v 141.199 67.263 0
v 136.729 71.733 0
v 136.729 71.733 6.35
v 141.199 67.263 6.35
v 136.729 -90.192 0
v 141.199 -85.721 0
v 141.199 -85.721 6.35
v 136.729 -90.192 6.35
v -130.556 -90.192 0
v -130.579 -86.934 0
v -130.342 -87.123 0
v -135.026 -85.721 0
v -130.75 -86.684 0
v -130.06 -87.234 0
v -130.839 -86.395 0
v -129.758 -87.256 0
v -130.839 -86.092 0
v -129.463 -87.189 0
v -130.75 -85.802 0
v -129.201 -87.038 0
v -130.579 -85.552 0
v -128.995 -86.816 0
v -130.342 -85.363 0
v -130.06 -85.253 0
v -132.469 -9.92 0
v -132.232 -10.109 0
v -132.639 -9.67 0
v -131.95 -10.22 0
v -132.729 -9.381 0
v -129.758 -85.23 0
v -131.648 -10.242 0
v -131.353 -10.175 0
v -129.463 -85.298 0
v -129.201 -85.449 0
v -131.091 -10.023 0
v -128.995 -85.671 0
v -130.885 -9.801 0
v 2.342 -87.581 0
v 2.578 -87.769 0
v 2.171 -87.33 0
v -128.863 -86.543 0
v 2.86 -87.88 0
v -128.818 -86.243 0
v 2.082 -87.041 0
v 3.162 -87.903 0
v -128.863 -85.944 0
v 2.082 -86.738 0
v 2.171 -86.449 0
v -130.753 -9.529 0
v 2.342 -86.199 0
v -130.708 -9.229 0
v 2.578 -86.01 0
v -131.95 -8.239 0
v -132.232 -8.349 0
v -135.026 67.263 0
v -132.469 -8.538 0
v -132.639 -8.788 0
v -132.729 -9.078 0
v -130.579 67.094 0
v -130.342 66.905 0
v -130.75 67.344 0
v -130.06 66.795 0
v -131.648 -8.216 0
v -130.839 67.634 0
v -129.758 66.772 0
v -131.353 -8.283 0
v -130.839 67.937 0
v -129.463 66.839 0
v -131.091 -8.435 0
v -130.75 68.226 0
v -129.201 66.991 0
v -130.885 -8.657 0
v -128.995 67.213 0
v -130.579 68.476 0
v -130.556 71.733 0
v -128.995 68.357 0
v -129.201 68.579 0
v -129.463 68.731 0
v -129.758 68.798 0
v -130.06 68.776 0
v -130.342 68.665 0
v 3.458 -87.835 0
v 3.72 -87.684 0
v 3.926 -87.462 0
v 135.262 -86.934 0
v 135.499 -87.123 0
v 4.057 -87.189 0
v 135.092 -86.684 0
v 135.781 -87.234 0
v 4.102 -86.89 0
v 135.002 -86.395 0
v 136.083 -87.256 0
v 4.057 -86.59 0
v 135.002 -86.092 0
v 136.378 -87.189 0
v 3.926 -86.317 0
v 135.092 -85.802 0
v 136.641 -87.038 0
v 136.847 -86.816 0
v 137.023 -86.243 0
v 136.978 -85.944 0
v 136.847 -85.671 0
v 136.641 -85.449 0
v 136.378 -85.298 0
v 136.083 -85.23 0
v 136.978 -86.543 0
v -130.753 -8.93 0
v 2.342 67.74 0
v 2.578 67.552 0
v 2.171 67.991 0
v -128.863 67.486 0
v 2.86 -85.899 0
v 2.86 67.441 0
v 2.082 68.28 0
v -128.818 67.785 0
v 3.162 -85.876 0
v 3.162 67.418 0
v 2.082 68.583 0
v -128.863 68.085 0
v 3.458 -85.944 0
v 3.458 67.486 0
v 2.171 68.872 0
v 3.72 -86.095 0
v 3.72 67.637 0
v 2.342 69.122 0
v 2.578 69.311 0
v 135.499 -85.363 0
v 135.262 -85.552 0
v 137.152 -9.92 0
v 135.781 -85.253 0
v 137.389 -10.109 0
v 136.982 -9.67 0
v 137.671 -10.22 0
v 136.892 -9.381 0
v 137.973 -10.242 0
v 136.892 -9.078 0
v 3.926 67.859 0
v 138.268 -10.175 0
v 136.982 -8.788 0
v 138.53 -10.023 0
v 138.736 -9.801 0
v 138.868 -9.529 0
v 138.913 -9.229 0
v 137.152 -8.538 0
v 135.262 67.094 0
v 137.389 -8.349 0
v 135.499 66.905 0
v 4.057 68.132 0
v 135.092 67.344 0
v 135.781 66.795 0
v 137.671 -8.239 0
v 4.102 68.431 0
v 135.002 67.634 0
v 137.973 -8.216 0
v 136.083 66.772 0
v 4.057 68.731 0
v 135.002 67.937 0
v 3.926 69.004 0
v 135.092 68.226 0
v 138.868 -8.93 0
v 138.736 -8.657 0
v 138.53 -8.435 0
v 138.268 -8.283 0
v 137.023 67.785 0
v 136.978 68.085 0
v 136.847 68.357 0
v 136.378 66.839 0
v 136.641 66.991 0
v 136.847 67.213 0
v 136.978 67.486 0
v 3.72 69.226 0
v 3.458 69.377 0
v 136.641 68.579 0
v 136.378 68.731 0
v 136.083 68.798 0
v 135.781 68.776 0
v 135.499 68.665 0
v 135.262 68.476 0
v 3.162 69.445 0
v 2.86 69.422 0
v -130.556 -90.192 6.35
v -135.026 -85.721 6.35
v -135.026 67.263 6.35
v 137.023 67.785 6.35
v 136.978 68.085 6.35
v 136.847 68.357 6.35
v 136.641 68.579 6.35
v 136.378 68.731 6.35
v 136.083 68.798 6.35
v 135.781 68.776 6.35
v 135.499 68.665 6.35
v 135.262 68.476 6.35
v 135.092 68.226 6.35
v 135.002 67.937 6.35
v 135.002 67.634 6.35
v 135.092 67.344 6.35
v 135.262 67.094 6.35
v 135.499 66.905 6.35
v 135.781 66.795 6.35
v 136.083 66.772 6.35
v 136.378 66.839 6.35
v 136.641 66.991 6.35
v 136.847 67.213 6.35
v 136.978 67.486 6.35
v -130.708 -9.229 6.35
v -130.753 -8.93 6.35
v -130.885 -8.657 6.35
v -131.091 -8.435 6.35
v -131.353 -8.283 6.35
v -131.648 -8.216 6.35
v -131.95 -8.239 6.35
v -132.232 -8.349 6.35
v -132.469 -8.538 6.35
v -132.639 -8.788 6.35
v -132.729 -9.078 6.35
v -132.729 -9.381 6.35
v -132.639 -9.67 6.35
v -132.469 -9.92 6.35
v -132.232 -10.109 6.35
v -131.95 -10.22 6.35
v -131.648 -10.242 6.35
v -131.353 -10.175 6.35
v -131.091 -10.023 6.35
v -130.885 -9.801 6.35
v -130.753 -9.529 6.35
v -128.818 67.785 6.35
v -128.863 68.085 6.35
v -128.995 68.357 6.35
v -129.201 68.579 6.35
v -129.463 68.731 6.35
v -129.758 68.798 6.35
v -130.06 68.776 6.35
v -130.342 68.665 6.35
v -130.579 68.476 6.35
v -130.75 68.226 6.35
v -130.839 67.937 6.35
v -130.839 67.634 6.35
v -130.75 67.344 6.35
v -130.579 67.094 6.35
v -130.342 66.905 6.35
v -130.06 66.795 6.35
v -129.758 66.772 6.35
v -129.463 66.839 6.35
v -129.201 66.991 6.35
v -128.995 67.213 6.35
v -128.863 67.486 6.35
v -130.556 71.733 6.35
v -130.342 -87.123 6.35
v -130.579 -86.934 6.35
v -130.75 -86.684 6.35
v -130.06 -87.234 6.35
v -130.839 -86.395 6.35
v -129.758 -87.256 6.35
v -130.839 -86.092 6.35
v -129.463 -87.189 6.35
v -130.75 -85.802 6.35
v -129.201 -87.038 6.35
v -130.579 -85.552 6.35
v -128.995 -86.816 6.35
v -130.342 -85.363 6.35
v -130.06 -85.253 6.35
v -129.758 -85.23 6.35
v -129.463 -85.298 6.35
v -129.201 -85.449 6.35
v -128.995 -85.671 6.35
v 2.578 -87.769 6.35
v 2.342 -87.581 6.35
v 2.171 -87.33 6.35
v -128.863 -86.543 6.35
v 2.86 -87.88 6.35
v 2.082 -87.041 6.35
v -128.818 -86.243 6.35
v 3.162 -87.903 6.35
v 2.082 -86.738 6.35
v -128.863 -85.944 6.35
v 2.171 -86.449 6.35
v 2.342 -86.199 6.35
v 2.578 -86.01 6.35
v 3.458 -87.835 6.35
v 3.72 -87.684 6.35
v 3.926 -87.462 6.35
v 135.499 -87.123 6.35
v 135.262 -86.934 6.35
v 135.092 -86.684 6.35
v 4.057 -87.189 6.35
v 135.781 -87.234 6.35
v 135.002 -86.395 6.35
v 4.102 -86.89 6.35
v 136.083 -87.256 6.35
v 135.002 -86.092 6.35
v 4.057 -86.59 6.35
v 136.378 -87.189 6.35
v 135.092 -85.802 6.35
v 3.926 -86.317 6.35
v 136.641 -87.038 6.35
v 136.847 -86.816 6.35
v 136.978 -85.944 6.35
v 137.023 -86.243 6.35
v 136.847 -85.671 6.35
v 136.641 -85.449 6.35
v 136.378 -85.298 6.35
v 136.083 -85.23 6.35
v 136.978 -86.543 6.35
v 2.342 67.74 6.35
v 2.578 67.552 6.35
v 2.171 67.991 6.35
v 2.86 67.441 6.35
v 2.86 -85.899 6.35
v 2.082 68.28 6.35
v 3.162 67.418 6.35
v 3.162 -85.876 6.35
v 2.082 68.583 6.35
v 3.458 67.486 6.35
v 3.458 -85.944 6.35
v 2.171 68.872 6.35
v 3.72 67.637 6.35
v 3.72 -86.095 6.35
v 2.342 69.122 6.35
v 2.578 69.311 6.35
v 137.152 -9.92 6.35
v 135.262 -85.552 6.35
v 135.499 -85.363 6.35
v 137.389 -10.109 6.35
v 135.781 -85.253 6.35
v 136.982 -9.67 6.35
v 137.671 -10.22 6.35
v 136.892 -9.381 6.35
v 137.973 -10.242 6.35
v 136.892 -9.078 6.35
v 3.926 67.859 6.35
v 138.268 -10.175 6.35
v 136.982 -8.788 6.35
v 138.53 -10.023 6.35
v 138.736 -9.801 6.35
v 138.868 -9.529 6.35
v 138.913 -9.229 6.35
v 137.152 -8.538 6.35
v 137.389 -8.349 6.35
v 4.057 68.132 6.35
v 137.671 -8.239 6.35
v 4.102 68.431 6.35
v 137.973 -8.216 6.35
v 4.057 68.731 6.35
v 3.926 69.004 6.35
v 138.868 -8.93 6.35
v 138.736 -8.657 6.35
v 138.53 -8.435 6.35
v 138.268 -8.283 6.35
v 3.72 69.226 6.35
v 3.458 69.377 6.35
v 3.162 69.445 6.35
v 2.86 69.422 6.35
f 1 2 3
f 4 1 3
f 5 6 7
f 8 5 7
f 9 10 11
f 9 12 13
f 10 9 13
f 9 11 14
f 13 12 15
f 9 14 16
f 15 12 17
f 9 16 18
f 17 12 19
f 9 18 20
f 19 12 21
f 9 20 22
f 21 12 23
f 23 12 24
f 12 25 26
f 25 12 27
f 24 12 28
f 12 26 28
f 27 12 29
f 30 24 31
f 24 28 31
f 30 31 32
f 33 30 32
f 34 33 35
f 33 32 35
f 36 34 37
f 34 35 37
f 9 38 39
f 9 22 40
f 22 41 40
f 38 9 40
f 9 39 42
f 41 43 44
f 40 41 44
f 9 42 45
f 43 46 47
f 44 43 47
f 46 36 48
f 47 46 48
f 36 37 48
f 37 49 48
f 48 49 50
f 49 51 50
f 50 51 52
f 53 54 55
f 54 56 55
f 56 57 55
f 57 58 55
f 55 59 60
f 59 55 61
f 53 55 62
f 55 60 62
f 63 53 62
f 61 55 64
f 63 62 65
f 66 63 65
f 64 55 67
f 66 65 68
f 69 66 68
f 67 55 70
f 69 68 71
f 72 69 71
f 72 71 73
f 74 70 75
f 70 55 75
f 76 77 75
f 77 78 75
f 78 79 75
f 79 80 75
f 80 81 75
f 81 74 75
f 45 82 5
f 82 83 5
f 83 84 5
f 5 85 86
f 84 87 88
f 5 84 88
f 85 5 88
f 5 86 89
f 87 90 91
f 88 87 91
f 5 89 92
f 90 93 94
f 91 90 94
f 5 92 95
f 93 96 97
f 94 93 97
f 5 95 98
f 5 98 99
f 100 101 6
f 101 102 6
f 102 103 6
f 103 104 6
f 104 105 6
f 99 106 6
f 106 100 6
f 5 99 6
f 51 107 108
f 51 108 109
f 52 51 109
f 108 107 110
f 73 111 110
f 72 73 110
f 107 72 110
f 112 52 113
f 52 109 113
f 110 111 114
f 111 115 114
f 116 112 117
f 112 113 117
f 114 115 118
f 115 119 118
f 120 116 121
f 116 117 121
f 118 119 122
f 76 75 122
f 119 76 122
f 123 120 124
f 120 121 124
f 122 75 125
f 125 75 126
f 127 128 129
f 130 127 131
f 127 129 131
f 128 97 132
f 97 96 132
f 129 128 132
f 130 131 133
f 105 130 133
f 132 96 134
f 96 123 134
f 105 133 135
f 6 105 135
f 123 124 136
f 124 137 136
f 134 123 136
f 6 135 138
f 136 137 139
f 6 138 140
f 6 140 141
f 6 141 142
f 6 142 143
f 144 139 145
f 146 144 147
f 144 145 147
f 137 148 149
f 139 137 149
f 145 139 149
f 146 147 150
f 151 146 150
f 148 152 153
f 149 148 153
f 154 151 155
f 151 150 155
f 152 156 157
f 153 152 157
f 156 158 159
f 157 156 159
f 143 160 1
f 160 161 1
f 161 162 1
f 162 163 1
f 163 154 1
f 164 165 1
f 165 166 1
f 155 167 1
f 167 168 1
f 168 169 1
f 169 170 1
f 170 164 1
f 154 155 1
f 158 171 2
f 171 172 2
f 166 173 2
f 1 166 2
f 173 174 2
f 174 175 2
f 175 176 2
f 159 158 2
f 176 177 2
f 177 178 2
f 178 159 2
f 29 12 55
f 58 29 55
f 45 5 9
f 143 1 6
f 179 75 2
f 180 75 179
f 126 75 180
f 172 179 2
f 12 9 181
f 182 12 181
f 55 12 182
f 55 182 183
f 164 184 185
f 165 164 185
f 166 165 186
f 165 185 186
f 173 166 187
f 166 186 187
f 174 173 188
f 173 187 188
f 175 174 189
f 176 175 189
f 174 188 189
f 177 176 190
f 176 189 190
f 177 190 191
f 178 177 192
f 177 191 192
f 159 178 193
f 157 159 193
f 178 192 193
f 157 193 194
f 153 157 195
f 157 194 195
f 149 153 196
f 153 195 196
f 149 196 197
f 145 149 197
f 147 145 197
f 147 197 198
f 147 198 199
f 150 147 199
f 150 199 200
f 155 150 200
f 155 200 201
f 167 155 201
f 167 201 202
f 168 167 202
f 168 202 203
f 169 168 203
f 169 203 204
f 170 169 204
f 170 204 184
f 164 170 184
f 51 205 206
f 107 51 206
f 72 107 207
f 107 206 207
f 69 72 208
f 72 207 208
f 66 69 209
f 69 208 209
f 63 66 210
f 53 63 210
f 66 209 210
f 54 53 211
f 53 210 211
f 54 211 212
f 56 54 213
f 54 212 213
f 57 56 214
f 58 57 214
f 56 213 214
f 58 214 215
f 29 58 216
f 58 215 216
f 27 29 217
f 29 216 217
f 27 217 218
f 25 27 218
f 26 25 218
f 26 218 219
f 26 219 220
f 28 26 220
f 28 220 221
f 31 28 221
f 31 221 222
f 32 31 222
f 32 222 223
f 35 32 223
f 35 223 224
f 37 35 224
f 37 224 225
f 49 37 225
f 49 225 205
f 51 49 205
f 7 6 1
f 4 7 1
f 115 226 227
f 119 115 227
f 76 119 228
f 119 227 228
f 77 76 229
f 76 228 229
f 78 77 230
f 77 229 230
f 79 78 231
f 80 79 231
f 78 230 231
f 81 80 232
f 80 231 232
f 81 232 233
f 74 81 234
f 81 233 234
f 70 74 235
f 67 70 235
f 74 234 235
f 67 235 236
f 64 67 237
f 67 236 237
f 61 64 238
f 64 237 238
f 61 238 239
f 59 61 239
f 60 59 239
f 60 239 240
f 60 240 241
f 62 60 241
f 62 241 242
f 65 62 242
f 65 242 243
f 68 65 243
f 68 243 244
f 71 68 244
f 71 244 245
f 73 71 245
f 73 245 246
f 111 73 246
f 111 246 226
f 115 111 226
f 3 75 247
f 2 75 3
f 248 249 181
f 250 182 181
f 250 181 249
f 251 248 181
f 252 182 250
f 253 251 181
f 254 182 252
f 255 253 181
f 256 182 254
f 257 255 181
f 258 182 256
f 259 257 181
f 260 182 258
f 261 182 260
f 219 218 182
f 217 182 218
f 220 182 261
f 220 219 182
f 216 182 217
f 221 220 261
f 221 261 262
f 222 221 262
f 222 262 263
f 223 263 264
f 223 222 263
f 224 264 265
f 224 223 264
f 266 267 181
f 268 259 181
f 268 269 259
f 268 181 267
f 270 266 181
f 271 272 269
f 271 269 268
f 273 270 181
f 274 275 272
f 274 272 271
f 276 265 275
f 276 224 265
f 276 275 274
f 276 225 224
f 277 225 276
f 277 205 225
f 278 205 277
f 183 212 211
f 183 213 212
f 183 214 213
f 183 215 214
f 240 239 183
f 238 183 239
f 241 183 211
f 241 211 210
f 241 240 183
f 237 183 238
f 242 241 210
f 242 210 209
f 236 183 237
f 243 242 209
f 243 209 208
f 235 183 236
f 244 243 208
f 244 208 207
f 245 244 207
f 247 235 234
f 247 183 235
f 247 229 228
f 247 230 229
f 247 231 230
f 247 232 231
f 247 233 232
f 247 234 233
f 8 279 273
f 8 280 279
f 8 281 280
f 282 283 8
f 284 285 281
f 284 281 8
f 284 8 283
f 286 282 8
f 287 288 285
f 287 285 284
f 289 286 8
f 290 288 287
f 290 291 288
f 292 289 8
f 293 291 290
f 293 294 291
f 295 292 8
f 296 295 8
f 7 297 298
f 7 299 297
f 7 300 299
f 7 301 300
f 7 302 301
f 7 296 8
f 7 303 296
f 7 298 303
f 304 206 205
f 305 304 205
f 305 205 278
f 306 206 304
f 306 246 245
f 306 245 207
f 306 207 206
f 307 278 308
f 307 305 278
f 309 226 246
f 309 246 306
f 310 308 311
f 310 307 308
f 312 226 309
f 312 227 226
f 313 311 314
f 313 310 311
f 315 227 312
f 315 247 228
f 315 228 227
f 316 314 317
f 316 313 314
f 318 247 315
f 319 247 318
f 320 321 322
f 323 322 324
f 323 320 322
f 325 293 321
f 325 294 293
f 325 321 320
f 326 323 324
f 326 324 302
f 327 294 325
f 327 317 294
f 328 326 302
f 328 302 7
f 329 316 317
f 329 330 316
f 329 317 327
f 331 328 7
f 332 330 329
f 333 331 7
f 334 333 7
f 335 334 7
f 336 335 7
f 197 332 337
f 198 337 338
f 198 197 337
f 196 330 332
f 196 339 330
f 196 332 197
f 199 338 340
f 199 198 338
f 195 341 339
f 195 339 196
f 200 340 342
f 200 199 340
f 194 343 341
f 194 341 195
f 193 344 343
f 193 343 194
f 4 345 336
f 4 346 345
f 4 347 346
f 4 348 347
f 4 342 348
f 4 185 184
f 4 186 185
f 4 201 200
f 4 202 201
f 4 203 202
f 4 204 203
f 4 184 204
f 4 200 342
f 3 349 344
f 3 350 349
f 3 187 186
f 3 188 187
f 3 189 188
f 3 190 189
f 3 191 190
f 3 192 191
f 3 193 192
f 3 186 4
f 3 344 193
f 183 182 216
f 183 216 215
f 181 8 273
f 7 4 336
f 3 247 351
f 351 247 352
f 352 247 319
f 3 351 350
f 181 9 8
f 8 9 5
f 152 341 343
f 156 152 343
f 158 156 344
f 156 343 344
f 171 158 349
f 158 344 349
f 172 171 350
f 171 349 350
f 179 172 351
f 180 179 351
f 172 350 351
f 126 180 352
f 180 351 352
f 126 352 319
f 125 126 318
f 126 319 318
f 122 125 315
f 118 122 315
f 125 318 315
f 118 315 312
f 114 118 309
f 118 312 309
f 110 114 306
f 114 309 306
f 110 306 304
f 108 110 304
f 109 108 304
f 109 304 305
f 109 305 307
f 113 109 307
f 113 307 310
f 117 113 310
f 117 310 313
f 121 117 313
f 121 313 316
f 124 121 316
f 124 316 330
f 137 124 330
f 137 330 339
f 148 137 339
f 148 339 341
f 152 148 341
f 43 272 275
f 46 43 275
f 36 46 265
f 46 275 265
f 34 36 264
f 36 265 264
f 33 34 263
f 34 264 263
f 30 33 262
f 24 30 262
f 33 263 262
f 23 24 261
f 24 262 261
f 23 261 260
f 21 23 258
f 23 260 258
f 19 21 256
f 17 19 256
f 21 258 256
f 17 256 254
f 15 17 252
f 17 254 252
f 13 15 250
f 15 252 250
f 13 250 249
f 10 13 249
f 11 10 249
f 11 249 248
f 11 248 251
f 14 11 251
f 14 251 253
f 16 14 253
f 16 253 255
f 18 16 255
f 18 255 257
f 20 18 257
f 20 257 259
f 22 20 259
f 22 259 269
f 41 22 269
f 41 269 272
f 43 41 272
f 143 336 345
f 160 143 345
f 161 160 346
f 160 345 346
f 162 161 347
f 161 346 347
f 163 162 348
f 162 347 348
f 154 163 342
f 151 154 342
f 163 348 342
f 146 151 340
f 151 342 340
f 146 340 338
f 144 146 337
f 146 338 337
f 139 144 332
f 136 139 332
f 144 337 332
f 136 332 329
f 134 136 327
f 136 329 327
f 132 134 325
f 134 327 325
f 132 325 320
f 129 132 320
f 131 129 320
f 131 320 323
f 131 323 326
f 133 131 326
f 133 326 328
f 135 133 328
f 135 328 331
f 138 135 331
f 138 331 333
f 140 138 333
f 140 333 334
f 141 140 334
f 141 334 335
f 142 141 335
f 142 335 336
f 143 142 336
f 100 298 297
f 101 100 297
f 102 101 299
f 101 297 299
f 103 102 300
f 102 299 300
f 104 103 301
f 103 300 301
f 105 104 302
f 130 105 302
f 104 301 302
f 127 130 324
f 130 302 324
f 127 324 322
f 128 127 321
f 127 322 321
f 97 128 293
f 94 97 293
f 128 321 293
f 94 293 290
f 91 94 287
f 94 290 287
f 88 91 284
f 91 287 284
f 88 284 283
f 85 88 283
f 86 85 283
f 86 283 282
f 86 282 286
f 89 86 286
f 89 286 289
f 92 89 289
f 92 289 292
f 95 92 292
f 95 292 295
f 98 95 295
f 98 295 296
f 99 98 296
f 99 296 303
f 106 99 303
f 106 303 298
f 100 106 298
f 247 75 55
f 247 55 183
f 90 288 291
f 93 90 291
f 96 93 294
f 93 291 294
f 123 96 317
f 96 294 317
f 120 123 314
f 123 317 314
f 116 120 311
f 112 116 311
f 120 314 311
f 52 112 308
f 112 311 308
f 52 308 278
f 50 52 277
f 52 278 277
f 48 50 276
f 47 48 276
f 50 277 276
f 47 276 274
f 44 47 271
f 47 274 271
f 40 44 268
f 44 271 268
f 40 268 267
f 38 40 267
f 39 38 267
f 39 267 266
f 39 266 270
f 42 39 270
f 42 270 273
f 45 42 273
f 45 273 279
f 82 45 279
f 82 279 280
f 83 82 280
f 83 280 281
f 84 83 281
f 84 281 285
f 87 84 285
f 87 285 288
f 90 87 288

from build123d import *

# Parameters (mm, degrees)
F0_W     = 276.225
F0_H     = 161.925
F1_DEPTH = 6.35
F2_SIZE  = 4.4704
F3_R     = 1.016
F4_DEPTH = 6.351


with BuildPart() as f1:
    # F0 (on Top) → F1 (new body)
    with BuildSketch(Plane.XY):
        with Locations((3.086437, -9.229104)):
            Rectangle(F0_W, F0_H)
    extrude(amount=F1_DEPTH)

    # F2
    f2_edges = [f1.edges().sort_by_distance(p)[0] for p in [
        (-135.026063, 71.733396, 3.175),
        (141.198937, 71.733396, 3.175),
        (141.198937, -90.191604, 3.175),
        (-135.026063, -90.191604, 3.175),
    ]]
    chamfer(f2_edges, length=F2_SIZE)

    # F3 (on face) → F4 (cut, through all)
    with BuildSketch(Plane.XY.offset(6.35)):
        with Locations((-131.724063, -9.229104)):
            Circle(F3_R)
        with Locations((3.086437, -86.889604)):
            Circle(F3_R)
        with Locations((3.086437, 68.431396)):
            Circle(F3_R)
        with Locations((-129.834213, 67.785113)):
            Circle(F3_R)
        with Locations((-129.834213, -86.243321)):
            Circle(F3_R)
        with Locations((136.007086, -86.243321)):
            Circle(F3_R)
        with Locations((137.896937, -9.229104)):
            Circle(F3_R)
        with Locations((136.007086, 67.785113)):
            Circle(F3_R)
    extrude(amount=-F4_DEPTH, mode=Mode.SUBTRACT)


solid = f1.part
